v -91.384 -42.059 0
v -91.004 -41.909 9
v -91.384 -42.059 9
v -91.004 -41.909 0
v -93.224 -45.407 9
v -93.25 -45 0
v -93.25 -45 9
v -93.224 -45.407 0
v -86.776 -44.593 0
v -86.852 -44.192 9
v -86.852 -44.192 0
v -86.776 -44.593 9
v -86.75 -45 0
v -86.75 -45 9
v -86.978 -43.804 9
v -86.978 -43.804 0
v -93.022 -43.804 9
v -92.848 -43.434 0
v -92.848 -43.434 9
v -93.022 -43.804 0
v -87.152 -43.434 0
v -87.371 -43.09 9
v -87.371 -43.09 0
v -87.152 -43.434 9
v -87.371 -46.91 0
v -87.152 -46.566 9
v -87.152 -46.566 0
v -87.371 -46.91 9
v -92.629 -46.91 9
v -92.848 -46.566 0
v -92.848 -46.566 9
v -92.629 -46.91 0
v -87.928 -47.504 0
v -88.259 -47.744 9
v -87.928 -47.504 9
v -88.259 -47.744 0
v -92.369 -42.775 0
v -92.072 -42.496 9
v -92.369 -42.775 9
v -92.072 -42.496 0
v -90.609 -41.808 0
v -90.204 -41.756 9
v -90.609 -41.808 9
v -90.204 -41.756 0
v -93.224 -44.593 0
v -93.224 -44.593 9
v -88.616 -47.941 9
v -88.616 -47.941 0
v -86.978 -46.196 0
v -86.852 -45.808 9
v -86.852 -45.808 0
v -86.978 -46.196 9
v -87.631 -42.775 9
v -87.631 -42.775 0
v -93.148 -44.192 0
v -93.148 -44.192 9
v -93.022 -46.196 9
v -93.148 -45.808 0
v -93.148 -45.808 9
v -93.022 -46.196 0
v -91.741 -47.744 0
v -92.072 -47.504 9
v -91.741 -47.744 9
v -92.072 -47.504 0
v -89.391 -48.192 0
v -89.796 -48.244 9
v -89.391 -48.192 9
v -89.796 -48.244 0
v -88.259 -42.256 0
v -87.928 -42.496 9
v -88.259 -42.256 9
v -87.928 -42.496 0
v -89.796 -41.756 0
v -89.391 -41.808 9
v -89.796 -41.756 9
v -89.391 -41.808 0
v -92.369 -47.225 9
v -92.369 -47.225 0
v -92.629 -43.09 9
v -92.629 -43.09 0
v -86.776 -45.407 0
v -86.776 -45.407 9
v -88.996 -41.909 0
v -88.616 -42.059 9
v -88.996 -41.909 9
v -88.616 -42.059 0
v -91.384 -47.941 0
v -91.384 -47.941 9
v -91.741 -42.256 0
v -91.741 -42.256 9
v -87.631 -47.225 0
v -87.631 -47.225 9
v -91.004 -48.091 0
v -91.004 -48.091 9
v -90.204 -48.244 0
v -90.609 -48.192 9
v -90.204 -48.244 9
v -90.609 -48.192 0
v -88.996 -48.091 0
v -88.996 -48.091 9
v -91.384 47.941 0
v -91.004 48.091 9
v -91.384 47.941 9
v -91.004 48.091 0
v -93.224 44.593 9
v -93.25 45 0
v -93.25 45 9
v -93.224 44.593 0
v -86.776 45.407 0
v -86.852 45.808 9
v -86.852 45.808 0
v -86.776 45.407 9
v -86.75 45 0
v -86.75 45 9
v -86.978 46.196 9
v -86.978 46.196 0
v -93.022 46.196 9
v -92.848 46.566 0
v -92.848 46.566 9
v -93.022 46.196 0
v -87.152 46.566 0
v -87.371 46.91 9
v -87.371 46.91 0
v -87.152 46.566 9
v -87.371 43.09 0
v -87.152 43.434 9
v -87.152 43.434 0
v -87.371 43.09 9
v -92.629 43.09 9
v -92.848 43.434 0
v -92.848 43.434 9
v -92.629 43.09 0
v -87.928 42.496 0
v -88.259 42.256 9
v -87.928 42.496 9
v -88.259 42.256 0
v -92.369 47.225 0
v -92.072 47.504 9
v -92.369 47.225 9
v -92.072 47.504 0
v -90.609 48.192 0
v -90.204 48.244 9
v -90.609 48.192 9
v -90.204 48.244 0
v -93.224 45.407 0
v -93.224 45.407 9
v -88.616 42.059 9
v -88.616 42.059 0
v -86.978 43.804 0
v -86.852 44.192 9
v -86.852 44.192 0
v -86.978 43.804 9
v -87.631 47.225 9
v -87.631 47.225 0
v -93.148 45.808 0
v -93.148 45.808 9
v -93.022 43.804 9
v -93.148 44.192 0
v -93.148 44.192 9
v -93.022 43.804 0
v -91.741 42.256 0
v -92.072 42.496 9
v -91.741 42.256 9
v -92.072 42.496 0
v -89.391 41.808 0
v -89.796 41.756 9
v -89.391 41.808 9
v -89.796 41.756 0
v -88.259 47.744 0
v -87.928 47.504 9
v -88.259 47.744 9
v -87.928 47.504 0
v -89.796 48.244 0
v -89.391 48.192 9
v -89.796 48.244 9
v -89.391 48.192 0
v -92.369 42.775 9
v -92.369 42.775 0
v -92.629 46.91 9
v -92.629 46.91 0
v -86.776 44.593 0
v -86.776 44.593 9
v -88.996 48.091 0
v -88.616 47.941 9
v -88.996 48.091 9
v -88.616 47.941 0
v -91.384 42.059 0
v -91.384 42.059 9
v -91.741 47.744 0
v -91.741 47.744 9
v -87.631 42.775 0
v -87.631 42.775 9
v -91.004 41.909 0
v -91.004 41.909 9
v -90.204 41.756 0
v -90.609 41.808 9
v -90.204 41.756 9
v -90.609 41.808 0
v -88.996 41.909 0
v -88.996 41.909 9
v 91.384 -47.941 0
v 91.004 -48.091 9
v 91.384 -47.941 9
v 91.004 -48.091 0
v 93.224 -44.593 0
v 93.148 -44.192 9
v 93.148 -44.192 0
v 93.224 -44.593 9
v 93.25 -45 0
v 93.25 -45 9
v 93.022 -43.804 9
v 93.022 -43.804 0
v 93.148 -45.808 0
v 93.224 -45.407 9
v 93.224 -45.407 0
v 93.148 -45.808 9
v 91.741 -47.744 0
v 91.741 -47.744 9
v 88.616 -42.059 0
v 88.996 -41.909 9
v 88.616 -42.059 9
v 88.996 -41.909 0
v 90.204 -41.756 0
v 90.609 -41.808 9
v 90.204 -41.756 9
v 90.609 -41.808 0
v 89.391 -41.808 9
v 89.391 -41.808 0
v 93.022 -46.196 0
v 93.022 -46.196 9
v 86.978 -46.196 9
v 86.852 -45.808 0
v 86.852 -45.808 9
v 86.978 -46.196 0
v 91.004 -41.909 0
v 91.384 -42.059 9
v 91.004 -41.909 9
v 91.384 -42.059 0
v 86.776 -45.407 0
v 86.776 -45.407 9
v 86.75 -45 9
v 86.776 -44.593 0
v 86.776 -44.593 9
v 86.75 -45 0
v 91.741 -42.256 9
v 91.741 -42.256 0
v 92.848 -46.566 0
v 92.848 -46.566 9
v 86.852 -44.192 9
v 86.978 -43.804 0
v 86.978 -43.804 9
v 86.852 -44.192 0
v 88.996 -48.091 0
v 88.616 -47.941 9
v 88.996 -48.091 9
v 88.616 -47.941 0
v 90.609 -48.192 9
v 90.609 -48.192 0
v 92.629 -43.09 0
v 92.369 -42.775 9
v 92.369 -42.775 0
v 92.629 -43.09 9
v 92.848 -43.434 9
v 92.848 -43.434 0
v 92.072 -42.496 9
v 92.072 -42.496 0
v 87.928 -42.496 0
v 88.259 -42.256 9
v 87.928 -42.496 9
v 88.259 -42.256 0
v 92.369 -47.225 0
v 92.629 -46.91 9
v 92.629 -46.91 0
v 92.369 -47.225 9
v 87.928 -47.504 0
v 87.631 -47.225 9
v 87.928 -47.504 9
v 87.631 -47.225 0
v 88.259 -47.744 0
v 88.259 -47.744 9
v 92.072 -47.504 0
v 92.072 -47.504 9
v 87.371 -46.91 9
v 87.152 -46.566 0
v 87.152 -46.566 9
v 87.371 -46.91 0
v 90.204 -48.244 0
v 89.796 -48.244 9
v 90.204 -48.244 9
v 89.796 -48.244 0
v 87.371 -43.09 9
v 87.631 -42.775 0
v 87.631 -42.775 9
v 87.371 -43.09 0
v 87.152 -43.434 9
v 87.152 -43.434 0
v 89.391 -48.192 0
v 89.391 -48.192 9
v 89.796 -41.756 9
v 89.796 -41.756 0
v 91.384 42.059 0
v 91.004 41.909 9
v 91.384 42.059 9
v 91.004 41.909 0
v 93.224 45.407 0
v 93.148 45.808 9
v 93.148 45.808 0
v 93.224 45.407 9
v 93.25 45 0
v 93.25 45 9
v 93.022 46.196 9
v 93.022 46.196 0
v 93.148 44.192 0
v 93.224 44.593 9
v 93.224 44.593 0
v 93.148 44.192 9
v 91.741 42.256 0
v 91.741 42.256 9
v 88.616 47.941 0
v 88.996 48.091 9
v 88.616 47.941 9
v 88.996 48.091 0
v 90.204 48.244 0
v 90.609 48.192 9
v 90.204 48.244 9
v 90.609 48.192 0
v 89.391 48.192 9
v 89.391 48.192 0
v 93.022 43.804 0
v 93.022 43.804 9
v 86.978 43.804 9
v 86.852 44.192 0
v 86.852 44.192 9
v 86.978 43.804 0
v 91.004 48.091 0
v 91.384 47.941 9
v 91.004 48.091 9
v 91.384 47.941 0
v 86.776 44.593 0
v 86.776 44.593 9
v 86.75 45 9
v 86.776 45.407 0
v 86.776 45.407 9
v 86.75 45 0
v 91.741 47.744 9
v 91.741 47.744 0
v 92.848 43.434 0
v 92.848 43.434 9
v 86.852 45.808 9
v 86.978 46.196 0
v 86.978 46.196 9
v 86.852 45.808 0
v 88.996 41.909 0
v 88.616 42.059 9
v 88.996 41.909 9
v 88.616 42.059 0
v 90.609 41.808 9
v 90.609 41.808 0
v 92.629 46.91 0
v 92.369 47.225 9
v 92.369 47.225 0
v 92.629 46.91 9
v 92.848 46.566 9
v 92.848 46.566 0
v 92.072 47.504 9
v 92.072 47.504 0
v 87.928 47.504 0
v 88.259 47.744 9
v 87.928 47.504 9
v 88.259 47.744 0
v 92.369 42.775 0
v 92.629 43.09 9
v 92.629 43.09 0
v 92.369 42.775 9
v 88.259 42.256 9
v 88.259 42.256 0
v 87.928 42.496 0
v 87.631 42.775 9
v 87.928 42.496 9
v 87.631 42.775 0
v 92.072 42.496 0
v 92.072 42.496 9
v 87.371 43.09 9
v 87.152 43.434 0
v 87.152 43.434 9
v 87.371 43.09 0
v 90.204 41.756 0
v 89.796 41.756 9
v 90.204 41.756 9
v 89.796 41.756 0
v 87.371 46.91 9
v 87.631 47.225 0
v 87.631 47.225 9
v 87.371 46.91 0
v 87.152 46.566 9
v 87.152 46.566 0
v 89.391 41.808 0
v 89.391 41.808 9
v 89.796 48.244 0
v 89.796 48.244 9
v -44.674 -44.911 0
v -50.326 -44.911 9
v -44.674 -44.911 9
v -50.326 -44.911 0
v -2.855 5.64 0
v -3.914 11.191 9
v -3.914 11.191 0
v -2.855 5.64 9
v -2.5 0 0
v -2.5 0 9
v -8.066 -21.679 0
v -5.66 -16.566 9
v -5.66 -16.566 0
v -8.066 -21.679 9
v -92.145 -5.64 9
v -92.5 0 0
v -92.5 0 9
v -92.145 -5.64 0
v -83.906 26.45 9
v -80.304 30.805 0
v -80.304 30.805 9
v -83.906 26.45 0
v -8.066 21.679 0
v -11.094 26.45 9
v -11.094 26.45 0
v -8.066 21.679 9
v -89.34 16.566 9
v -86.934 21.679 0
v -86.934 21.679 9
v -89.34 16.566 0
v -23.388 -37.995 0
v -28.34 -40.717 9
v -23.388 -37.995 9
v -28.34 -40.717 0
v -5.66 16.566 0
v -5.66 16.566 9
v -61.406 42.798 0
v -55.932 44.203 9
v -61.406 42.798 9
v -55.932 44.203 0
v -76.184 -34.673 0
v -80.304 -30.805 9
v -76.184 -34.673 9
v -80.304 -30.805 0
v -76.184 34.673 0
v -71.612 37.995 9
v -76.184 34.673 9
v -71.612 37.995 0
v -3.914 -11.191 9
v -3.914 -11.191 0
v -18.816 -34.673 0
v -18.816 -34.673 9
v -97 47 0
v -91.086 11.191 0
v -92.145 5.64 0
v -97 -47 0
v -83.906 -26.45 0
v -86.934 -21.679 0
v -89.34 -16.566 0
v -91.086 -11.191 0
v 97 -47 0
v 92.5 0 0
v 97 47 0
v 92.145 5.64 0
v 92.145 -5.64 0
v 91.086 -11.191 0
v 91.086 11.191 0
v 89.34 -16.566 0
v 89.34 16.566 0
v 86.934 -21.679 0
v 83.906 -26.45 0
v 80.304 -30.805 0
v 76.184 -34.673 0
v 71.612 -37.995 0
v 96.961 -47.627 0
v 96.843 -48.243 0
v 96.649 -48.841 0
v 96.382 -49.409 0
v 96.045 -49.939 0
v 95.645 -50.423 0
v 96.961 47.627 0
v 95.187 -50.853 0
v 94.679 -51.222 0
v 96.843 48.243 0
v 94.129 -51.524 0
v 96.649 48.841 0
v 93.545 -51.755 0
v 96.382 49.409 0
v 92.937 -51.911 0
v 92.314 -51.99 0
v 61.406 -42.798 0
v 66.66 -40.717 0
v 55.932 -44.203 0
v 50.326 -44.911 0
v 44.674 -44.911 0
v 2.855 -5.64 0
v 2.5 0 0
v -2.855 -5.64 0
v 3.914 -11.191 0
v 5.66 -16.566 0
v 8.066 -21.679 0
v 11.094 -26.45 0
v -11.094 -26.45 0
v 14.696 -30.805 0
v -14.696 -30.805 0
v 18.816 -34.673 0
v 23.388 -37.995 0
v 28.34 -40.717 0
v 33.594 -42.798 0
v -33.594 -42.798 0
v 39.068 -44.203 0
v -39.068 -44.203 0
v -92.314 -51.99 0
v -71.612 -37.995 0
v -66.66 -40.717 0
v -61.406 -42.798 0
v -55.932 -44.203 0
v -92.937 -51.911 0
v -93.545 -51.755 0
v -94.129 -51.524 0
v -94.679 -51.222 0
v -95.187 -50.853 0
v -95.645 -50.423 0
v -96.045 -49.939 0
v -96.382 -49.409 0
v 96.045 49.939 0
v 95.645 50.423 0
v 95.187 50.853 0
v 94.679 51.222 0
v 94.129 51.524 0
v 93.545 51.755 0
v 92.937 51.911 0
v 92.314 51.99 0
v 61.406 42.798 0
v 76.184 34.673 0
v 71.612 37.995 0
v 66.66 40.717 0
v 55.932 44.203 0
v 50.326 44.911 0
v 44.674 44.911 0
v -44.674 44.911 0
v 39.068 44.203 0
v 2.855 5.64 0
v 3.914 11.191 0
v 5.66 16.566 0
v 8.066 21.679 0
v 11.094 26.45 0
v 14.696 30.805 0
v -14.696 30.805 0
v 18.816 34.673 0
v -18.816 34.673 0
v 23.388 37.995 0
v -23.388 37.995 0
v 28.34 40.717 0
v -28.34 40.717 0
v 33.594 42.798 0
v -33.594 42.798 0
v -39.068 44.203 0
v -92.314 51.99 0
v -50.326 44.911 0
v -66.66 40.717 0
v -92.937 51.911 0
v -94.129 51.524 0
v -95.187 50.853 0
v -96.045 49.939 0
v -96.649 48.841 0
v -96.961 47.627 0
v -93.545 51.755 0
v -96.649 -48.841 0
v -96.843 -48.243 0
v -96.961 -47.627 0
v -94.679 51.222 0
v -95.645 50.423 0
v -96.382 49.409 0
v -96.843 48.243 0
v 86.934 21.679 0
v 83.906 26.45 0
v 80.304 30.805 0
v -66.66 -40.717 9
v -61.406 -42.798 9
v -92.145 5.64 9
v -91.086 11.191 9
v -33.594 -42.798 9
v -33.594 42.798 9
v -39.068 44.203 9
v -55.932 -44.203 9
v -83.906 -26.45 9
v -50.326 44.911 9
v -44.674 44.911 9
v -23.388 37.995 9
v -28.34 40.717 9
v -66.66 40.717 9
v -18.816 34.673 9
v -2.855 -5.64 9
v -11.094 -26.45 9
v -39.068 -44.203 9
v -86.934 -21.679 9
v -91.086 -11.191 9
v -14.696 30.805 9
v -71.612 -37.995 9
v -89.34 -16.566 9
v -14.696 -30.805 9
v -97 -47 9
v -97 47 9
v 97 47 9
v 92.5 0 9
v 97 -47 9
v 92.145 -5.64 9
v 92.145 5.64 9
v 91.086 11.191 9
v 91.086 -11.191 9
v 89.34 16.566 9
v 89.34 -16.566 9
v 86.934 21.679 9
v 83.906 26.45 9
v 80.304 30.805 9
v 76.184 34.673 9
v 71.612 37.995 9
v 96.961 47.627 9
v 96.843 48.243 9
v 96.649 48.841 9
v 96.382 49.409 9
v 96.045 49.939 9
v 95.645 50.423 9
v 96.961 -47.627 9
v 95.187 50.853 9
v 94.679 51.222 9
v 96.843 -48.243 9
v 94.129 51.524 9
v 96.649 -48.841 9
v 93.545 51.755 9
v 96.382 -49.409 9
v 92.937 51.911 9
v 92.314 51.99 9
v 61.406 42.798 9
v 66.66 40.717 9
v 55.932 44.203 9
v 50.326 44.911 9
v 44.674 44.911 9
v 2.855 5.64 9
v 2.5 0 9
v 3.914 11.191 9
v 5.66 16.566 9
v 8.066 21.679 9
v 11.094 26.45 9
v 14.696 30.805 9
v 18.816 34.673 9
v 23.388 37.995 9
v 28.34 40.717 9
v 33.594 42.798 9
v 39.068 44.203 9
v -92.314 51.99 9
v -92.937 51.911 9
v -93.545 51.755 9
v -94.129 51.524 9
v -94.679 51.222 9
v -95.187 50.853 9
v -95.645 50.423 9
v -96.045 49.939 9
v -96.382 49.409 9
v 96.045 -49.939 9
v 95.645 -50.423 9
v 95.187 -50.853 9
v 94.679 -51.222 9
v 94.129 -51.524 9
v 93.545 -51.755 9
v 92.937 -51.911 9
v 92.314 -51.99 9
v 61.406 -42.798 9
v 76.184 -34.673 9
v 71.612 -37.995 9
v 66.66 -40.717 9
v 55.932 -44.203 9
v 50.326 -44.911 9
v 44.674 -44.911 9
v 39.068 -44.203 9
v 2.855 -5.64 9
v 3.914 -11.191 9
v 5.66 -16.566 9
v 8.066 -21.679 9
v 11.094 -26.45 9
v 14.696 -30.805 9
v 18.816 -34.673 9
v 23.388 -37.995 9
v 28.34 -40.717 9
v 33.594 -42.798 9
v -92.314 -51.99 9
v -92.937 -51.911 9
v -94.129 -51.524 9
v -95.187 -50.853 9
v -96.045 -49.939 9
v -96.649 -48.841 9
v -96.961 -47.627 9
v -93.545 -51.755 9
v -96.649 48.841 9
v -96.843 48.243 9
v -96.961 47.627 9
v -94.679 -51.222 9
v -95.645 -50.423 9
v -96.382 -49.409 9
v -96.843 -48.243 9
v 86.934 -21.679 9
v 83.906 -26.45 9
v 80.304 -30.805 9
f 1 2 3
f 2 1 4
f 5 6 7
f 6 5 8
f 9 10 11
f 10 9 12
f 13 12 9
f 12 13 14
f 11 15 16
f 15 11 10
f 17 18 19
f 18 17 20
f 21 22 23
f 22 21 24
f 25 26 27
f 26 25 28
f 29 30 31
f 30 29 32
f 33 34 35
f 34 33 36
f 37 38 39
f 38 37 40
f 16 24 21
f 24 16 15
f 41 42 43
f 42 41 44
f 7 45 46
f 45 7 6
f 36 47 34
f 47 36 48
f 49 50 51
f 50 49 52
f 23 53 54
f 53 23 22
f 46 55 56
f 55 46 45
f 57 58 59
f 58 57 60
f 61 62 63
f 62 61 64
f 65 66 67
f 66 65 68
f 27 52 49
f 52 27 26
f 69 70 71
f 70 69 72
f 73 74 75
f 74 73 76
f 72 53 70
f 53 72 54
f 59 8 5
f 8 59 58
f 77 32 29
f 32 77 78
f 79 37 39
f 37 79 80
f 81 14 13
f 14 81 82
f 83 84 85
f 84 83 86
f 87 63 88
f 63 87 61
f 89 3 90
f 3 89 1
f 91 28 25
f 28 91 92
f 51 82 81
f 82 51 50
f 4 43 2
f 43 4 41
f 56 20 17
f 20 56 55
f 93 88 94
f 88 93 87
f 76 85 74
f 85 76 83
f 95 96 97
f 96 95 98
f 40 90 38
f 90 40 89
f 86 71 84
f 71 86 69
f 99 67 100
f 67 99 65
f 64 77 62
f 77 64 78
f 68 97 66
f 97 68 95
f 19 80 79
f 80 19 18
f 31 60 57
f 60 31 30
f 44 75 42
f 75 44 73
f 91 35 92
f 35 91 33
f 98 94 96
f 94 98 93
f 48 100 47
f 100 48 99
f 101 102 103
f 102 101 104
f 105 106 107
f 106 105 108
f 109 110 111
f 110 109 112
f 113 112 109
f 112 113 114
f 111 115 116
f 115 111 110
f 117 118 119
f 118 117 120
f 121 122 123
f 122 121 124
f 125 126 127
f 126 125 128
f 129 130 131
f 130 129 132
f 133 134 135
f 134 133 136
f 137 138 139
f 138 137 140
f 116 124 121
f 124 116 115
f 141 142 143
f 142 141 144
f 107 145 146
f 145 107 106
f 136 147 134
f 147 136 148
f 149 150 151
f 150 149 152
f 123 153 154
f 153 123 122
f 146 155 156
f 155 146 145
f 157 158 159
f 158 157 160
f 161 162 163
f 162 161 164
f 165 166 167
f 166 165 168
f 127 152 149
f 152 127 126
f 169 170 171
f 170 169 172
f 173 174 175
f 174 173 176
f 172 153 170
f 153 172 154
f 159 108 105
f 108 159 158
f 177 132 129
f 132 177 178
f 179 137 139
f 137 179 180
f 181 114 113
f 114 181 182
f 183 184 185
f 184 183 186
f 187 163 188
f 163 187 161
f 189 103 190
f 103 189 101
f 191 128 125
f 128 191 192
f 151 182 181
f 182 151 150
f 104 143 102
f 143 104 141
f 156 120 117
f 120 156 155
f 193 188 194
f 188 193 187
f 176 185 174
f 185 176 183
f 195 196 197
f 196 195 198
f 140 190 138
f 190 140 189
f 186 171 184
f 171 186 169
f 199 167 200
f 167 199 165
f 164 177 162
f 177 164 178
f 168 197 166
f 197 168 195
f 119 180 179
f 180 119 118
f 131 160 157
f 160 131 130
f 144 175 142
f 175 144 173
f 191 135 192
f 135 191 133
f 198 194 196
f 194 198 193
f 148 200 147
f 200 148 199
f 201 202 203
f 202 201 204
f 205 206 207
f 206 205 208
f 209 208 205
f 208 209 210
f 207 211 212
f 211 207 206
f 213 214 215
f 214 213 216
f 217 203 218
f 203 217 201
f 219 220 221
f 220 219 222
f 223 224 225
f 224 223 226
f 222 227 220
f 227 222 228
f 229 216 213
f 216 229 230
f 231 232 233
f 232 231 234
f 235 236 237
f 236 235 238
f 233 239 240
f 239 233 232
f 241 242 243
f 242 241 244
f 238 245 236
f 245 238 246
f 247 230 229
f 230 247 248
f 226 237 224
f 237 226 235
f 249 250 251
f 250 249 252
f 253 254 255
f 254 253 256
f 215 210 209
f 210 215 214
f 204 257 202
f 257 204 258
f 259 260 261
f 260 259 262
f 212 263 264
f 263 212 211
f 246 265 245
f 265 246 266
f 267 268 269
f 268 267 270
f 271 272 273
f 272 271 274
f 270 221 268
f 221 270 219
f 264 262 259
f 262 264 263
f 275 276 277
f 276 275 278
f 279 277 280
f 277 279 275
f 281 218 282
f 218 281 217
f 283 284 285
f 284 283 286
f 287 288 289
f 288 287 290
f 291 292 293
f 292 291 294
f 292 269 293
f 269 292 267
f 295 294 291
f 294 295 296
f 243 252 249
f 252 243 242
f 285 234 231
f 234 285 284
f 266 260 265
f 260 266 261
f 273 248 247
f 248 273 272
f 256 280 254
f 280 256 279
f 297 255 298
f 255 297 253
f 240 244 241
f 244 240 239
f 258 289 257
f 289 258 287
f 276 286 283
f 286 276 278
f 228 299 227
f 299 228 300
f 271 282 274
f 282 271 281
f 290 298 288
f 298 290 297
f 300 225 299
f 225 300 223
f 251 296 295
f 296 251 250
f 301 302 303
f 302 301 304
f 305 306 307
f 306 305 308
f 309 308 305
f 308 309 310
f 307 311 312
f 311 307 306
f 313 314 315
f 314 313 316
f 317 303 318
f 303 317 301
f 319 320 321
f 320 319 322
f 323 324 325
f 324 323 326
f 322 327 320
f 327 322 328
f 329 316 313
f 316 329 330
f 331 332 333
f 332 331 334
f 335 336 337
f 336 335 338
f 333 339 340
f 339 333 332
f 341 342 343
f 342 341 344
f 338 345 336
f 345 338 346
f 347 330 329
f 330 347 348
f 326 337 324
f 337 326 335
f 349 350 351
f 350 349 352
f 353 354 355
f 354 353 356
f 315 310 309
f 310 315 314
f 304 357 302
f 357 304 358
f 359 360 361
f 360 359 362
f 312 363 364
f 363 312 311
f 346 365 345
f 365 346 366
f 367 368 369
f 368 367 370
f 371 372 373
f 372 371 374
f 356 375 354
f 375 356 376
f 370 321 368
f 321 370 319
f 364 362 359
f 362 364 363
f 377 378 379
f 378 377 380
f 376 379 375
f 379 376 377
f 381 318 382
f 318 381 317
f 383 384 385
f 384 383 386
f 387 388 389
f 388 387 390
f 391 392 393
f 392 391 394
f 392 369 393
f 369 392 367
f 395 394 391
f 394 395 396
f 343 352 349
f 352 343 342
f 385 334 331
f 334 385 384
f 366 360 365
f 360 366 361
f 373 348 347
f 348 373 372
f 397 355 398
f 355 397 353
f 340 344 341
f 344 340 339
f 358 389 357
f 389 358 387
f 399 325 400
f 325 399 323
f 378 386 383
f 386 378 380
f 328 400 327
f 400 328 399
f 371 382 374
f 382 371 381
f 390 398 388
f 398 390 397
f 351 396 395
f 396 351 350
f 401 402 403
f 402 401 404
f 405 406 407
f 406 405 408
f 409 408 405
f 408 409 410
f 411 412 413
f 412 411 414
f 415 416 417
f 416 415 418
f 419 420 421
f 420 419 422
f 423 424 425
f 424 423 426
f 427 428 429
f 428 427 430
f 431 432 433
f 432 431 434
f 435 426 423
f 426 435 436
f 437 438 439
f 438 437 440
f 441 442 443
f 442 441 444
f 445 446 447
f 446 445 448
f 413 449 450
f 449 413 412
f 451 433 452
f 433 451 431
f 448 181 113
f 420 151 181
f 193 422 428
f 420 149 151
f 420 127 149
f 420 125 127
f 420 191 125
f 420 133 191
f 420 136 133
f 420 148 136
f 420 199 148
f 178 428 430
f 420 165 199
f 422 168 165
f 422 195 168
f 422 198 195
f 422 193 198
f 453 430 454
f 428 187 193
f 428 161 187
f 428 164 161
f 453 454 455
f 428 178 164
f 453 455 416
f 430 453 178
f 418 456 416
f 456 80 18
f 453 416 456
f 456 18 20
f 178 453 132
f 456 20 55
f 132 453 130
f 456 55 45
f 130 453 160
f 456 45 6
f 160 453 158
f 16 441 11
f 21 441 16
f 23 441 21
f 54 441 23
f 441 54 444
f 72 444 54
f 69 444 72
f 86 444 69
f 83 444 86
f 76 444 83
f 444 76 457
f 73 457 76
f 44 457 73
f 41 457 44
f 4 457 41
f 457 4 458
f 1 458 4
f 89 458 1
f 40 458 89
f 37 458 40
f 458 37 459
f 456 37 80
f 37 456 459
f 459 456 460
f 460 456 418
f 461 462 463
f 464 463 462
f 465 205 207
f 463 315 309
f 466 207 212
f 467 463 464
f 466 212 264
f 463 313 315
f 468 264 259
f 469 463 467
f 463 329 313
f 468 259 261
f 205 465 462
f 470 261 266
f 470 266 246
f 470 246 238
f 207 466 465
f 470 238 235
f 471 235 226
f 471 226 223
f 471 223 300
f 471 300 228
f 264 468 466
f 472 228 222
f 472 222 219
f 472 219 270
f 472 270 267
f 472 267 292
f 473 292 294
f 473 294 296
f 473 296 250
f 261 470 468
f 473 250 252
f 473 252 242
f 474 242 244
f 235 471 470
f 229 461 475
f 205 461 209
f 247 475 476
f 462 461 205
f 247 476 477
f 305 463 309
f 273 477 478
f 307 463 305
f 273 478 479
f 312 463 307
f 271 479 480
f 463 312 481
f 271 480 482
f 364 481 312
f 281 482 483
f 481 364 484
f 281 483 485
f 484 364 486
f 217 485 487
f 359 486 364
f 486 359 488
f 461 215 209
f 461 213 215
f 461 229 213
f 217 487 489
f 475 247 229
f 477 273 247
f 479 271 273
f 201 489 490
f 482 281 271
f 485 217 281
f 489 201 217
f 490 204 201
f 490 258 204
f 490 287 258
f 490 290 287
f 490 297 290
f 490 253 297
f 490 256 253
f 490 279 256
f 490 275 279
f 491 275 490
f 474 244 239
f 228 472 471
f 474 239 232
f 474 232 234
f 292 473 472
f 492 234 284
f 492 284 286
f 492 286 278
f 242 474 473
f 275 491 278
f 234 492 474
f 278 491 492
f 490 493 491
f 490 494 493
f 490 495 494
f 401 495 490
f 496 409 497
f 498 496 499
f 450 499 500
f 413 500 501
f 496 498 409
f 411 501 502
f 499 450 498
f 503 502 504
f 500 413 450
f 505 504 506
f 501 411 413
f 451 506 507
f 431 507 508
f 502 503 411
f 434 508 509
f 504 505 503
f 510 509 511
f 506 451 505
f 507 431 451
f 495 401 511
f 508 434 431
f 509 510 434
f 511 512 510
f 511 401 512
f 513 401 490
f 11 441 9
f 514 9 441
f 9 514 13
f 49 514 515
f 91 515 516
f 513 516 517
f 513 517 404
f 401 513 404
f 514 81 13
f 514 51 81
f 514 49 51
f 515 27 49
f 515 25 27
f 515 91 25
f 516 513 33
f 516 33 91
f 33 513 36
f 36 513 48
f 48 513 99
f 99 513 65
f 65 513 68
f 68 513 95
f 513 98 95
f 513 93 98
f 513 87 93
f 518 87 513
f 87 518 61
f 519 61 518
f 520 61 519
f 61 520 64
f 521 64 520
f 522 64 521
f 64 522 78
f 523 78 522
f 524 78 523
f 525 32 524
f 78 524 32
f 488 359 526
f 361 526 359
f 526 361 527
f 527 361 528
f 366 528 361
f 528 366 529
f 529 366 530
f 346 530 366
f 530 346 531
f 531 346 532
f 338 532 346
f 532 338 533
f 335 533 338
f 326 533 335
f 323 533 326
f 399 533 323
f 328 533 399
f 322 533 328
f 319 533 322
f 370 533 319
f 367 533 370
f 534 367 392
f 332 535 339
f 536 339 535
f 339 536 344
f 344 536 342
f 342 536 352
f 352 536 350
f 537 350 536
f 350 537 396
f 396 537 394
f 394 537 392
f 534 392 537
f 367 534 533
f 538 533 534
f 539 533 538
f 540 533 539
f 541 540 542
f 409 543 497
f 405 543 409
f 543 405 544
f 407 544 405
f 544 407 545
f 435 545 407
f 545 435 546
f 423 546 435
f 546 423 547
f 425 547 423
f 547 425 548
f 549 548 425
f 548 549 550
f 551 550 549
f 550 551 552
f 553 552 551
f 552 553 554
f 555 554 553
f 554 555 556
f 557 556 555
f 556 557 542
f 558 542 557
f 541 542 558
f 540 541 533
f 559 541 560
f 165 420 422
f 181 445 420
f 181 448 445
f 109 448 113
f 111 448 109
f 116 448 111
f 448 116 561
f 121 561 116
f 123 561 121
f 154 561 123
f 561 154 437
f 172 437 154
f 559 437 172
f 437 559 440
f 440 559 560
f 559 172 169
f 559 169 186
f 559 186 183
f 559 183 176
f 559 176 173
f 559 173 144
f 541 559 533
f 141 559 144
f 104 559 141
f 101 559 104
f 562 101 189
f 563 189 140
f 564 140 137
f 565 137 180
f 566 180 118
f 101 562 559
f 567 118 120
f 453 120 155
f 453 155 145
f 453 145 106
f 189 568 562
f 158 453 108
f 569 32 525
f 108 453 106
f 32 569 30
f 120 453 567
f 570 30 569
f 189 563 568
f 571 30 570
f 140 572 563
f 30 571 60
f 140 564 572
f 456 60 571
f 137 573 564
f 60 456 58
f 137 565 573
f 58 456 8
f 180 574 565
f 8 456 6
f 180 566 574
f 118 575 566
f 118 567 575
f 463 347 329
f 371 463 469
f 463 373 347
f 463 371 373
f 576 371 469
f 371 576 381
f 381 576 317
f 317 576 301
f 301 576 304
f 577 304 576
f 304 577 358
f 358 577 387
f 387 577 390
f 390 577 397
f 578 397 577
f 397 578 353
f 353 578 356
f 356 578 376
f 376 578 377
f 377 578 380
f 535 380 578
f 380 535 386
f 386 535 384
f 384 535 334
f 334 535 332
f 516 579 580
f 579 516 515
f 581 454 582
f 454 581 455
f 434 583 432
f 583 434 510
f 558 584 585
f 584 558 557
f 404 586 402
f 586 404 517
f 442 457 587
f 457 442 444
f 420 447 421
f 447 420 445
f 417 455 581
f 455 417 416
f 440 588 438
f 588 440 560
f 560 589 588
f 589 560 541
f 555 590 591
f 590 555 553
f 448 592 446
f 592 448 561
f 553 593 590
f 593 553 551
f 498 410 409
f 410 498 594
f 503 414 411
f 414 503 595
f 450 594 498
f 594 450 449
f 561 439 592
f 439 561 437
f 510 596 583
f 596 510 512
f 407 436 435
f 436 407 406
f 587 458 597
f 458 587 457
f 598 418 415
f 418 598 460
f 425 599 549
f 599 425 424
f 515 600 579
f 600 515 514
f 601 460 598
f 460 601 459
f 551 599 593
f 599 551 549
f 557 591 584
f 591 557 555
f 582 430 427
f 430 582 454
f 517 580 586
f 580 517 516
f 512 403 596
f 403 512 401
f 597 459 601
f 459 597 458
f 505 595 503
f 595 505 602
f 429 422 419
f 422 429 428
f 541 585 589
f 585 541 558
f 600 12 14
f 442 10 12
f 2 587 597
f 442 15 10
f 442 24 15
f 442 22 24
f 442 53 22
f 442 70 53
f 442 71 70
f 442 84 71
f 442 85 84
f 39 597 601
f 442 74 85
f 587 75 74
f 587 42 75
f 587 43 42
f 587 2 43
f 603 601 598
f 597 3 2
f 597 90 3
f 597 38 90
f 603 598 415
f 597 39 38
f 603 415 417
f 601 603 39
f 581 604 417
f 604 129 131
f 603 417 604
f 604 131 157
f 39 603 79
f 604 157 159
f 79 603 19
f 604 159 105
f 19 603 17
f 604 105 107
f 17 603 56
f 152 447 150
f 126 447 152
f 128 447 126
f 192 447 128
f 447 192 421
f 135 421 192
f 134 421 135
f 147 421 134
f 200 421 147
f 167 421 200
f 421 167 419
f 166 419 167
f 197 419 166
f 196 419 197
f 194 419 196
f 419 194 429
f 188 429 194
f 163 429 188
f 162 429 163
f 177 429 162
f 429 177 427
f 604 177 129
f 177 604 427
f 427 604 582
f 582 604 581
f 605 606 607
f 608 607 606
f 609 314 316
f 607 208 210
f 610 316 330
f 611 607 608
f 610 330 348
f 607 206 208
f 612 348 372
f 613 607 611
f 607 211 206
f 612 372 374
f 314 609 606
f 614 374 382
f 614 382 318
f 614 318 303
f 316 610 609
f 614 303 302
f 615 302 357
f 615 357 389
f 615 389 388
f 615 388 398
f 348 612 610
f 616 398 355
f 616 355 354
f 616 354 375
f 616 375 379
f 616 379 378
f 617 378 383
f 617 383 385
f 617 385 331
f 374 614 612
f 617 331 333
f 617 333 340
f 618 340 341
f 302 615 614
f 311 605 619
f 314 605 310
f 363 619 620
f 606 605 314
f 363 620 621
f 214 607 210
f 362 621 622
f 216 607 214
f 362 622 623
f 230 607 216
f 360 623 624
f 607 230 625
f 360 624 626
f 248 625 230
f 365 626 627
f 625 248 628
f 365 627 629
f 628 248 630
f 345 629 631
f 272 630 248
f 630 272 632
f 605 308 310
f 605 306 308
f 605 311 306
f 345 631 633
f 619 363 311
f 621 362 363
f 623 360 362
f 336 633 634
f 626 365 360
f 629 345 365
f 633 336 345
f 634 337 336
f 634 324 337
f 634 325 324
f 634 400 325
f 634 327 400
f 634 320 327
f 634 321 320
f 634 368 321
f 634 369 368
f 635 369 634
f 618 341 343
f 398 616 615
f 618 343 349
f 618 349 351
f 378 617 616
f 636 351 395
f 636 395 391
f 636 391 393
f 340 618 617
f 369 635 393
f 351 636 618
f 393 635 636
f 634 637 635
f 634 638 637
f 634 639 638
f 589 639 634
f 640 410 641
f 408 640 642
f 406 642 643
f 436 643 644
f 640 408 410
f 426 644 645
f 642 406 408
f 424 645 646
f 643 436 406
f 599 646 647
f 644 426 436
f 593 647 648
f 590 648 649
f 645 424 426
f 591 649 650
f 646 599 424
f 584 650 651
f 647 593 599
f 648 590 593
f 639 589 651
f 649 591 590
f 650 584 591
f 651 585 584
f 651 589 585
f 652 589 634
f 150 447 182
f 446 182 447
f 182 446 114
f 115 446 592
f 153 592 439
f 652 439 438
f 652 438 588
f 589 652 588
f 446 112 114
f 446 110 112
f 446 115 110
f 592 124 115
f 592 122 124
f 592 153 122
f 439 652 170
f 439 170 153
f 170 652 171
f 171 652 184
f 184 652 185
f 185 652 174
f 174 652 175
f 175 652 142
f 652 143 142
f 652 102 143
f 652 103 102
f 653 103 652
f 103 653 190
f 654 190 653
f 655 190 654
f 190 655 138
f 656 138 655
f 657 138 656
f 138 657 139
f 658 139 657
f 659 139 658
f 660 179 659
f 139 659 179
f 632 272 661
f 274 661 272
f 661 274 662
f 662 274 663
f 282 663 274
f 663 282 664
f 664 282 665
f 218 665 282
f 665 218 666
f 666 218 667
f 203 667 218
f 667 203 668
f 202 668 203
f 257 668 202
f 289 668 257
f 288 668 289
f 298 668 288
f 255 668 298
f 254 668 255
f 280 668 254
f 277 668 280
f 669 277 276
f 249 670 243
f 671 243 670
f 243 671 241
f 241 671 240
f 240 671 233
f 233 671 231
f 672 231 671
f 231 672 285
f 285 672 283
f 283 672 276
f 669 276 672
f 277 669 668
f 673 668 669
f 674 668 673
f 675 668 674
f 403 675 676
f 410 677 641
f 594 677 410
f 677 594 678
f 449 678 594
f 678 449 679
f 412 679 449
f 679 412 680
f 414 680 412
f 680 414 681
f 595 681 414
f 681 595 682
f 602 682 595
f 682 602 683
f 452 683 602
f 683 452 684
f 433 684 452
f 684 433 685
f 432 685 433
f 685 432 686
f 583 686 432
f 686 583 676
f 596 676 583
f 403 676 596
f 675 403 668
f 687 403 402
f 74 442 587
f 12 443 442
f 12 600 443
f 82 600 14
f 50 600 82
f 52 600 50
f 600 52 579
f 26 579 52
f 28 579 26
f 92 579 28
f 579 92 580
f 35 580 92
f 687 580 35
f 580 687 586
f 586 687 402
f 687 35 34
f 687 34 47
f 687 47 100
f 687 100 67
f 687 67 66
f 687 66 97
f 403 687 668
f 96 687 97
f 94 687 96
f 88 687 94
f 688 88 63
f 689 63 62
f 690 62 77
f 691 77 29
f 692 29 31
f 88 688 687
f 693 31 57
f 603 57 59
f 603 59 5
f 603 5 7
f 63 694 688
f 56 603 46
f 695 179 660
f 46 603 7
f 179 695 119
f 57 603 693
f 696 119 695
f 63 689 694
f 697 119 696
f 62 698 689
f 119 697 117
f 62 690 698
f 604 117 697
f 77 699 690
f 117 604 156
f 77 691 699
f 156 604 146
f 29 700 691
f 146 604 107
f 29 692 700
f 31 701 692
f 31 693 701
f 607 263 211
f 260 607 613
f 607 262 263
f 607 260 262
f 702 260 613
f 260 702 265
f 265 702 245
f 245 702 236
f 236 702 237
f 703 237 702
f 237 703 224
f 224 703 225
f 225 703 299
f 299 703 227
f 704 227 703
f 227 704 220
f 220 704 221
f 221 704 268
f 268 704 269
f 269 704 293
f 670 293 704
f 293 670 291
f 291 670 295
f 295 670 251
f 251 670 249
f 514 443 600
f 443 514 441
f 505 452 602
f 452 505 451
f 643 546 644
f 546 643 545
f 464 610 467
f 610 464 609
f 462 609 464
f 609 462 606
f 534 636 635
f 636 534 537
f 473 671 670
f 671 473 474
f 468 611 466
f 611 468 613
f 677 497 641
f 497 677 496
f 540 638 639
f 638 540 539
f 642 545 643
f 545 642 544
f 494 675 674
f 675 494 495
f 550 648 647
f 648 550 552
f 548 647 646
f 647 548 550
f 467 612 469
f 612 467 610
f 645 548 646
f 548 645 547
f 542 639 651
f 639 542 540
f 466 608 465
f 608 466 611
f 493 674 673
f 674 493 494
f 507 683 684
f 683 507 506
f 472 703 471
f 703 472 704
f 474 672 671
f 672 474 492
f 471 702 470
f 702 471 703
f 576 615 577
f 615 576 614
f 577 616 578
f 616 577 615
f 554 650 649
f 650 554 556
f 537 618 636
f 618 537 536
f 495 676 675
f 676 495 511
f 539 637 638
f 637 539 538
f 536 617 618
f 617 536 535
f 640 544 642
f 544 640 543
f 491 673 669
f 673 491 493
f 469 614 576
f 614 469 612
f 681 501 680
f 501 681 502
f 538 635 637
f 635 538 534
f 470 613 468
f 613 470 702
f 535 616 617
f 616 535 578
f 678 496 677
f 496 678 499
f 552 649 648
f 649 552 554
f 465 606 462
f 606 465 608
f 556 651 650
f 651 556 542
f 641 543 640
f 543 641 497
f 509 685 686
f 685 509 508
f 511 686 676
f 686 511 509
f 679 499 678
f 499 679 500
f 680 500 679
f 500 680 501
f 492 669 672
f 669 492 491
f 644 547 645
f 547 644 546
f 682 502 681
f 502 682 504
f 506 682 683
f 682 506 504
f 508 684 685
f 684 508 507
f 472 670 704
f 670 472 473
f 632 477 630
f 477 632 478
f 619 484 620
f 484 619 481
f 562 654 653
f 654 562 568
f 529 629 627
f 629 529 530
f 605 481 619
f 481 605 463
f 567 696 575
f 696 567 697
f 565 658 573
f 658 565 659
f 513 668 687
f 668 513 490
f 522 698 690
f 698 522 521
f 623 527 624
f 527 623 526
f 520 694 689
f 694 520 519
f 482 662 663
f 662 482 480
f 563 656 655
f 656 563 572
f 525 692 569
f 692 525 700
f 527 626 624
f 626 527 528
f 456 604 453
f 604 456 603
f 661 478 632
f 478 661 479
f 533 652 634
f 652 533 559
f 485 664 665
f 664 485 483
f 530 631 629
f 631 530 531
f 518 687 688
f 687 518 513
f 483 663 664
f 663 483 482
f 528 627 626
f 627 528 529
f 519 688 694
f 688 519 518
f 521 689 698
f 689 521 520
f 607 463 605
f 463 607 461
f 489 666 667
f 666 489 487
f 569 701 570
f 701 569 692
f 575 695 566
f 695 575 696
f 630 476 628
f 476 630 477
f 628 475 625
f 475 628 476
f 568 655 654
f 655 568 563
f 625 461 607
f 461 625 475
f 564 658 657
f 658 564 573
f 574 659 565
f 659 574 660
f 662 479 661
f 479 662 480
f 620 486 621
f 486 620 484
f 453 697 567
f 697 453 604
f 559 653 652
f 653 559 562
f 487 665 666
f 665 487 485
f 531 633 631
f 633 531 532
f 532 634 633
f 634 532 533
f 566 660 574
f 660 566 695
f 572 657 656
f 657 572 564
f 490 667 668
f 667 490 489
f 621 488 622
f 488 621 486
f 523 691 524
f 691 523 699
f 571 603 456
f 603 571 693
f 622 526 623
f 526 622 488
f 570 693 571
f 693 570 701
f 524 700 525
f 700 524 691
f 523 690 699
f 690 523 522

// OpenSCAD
$fn = 50;


difference() {
	union() {
		hull() {
			translate(v = [-92.0000000000, 47.0000000000, 0]) {
				cylinder(h = 9, r = 5);
			}
			translate(v = [92.0000000000, 47.0000000000, 0]) {
				cylinder(h = 9, r = 5);
			}
			translate(v = [-92.0000000000, -47.0000000000, 0]) {
				cylinder(h = 9, r = 5);
			}
			translate(v = [92.0000000000, -47.0000000000, 0]) {
				cylinder(h = 9, r = 5);
			}
		}
	}
	union() {
		#translate(v = [-90.0000000000, -45.0000000000, -100.0000000000]) {
			cylinder(h = 200, r = 3.2500000000);
		}
		#translate(v = [-90.0000000000, 45.0000000000, -100.0000000000]) {
			cylinder(h = 200, r = 3.2500000000);
		}
		#translate(v = [90.0000000000, -45.0000000000, -100.0000000000]) {
			cylinder(h = 200, r = 3.2500000000);
		}
		#translate(v = [90.0000000000, 45.0000000000, -100.0000000000]) {
			cylinder(h = 200, r = 3.2500000000);
		}
		#translate(v = [-47.5000000000, 0, 0]) {
			cylinder(h = 9, r = 45.0000000000);
		}
		#translate(v = [47.5000000000, 0, 0]) {
			cylinder(h = 9, r = 45.0000000000);
		}
	}
}
